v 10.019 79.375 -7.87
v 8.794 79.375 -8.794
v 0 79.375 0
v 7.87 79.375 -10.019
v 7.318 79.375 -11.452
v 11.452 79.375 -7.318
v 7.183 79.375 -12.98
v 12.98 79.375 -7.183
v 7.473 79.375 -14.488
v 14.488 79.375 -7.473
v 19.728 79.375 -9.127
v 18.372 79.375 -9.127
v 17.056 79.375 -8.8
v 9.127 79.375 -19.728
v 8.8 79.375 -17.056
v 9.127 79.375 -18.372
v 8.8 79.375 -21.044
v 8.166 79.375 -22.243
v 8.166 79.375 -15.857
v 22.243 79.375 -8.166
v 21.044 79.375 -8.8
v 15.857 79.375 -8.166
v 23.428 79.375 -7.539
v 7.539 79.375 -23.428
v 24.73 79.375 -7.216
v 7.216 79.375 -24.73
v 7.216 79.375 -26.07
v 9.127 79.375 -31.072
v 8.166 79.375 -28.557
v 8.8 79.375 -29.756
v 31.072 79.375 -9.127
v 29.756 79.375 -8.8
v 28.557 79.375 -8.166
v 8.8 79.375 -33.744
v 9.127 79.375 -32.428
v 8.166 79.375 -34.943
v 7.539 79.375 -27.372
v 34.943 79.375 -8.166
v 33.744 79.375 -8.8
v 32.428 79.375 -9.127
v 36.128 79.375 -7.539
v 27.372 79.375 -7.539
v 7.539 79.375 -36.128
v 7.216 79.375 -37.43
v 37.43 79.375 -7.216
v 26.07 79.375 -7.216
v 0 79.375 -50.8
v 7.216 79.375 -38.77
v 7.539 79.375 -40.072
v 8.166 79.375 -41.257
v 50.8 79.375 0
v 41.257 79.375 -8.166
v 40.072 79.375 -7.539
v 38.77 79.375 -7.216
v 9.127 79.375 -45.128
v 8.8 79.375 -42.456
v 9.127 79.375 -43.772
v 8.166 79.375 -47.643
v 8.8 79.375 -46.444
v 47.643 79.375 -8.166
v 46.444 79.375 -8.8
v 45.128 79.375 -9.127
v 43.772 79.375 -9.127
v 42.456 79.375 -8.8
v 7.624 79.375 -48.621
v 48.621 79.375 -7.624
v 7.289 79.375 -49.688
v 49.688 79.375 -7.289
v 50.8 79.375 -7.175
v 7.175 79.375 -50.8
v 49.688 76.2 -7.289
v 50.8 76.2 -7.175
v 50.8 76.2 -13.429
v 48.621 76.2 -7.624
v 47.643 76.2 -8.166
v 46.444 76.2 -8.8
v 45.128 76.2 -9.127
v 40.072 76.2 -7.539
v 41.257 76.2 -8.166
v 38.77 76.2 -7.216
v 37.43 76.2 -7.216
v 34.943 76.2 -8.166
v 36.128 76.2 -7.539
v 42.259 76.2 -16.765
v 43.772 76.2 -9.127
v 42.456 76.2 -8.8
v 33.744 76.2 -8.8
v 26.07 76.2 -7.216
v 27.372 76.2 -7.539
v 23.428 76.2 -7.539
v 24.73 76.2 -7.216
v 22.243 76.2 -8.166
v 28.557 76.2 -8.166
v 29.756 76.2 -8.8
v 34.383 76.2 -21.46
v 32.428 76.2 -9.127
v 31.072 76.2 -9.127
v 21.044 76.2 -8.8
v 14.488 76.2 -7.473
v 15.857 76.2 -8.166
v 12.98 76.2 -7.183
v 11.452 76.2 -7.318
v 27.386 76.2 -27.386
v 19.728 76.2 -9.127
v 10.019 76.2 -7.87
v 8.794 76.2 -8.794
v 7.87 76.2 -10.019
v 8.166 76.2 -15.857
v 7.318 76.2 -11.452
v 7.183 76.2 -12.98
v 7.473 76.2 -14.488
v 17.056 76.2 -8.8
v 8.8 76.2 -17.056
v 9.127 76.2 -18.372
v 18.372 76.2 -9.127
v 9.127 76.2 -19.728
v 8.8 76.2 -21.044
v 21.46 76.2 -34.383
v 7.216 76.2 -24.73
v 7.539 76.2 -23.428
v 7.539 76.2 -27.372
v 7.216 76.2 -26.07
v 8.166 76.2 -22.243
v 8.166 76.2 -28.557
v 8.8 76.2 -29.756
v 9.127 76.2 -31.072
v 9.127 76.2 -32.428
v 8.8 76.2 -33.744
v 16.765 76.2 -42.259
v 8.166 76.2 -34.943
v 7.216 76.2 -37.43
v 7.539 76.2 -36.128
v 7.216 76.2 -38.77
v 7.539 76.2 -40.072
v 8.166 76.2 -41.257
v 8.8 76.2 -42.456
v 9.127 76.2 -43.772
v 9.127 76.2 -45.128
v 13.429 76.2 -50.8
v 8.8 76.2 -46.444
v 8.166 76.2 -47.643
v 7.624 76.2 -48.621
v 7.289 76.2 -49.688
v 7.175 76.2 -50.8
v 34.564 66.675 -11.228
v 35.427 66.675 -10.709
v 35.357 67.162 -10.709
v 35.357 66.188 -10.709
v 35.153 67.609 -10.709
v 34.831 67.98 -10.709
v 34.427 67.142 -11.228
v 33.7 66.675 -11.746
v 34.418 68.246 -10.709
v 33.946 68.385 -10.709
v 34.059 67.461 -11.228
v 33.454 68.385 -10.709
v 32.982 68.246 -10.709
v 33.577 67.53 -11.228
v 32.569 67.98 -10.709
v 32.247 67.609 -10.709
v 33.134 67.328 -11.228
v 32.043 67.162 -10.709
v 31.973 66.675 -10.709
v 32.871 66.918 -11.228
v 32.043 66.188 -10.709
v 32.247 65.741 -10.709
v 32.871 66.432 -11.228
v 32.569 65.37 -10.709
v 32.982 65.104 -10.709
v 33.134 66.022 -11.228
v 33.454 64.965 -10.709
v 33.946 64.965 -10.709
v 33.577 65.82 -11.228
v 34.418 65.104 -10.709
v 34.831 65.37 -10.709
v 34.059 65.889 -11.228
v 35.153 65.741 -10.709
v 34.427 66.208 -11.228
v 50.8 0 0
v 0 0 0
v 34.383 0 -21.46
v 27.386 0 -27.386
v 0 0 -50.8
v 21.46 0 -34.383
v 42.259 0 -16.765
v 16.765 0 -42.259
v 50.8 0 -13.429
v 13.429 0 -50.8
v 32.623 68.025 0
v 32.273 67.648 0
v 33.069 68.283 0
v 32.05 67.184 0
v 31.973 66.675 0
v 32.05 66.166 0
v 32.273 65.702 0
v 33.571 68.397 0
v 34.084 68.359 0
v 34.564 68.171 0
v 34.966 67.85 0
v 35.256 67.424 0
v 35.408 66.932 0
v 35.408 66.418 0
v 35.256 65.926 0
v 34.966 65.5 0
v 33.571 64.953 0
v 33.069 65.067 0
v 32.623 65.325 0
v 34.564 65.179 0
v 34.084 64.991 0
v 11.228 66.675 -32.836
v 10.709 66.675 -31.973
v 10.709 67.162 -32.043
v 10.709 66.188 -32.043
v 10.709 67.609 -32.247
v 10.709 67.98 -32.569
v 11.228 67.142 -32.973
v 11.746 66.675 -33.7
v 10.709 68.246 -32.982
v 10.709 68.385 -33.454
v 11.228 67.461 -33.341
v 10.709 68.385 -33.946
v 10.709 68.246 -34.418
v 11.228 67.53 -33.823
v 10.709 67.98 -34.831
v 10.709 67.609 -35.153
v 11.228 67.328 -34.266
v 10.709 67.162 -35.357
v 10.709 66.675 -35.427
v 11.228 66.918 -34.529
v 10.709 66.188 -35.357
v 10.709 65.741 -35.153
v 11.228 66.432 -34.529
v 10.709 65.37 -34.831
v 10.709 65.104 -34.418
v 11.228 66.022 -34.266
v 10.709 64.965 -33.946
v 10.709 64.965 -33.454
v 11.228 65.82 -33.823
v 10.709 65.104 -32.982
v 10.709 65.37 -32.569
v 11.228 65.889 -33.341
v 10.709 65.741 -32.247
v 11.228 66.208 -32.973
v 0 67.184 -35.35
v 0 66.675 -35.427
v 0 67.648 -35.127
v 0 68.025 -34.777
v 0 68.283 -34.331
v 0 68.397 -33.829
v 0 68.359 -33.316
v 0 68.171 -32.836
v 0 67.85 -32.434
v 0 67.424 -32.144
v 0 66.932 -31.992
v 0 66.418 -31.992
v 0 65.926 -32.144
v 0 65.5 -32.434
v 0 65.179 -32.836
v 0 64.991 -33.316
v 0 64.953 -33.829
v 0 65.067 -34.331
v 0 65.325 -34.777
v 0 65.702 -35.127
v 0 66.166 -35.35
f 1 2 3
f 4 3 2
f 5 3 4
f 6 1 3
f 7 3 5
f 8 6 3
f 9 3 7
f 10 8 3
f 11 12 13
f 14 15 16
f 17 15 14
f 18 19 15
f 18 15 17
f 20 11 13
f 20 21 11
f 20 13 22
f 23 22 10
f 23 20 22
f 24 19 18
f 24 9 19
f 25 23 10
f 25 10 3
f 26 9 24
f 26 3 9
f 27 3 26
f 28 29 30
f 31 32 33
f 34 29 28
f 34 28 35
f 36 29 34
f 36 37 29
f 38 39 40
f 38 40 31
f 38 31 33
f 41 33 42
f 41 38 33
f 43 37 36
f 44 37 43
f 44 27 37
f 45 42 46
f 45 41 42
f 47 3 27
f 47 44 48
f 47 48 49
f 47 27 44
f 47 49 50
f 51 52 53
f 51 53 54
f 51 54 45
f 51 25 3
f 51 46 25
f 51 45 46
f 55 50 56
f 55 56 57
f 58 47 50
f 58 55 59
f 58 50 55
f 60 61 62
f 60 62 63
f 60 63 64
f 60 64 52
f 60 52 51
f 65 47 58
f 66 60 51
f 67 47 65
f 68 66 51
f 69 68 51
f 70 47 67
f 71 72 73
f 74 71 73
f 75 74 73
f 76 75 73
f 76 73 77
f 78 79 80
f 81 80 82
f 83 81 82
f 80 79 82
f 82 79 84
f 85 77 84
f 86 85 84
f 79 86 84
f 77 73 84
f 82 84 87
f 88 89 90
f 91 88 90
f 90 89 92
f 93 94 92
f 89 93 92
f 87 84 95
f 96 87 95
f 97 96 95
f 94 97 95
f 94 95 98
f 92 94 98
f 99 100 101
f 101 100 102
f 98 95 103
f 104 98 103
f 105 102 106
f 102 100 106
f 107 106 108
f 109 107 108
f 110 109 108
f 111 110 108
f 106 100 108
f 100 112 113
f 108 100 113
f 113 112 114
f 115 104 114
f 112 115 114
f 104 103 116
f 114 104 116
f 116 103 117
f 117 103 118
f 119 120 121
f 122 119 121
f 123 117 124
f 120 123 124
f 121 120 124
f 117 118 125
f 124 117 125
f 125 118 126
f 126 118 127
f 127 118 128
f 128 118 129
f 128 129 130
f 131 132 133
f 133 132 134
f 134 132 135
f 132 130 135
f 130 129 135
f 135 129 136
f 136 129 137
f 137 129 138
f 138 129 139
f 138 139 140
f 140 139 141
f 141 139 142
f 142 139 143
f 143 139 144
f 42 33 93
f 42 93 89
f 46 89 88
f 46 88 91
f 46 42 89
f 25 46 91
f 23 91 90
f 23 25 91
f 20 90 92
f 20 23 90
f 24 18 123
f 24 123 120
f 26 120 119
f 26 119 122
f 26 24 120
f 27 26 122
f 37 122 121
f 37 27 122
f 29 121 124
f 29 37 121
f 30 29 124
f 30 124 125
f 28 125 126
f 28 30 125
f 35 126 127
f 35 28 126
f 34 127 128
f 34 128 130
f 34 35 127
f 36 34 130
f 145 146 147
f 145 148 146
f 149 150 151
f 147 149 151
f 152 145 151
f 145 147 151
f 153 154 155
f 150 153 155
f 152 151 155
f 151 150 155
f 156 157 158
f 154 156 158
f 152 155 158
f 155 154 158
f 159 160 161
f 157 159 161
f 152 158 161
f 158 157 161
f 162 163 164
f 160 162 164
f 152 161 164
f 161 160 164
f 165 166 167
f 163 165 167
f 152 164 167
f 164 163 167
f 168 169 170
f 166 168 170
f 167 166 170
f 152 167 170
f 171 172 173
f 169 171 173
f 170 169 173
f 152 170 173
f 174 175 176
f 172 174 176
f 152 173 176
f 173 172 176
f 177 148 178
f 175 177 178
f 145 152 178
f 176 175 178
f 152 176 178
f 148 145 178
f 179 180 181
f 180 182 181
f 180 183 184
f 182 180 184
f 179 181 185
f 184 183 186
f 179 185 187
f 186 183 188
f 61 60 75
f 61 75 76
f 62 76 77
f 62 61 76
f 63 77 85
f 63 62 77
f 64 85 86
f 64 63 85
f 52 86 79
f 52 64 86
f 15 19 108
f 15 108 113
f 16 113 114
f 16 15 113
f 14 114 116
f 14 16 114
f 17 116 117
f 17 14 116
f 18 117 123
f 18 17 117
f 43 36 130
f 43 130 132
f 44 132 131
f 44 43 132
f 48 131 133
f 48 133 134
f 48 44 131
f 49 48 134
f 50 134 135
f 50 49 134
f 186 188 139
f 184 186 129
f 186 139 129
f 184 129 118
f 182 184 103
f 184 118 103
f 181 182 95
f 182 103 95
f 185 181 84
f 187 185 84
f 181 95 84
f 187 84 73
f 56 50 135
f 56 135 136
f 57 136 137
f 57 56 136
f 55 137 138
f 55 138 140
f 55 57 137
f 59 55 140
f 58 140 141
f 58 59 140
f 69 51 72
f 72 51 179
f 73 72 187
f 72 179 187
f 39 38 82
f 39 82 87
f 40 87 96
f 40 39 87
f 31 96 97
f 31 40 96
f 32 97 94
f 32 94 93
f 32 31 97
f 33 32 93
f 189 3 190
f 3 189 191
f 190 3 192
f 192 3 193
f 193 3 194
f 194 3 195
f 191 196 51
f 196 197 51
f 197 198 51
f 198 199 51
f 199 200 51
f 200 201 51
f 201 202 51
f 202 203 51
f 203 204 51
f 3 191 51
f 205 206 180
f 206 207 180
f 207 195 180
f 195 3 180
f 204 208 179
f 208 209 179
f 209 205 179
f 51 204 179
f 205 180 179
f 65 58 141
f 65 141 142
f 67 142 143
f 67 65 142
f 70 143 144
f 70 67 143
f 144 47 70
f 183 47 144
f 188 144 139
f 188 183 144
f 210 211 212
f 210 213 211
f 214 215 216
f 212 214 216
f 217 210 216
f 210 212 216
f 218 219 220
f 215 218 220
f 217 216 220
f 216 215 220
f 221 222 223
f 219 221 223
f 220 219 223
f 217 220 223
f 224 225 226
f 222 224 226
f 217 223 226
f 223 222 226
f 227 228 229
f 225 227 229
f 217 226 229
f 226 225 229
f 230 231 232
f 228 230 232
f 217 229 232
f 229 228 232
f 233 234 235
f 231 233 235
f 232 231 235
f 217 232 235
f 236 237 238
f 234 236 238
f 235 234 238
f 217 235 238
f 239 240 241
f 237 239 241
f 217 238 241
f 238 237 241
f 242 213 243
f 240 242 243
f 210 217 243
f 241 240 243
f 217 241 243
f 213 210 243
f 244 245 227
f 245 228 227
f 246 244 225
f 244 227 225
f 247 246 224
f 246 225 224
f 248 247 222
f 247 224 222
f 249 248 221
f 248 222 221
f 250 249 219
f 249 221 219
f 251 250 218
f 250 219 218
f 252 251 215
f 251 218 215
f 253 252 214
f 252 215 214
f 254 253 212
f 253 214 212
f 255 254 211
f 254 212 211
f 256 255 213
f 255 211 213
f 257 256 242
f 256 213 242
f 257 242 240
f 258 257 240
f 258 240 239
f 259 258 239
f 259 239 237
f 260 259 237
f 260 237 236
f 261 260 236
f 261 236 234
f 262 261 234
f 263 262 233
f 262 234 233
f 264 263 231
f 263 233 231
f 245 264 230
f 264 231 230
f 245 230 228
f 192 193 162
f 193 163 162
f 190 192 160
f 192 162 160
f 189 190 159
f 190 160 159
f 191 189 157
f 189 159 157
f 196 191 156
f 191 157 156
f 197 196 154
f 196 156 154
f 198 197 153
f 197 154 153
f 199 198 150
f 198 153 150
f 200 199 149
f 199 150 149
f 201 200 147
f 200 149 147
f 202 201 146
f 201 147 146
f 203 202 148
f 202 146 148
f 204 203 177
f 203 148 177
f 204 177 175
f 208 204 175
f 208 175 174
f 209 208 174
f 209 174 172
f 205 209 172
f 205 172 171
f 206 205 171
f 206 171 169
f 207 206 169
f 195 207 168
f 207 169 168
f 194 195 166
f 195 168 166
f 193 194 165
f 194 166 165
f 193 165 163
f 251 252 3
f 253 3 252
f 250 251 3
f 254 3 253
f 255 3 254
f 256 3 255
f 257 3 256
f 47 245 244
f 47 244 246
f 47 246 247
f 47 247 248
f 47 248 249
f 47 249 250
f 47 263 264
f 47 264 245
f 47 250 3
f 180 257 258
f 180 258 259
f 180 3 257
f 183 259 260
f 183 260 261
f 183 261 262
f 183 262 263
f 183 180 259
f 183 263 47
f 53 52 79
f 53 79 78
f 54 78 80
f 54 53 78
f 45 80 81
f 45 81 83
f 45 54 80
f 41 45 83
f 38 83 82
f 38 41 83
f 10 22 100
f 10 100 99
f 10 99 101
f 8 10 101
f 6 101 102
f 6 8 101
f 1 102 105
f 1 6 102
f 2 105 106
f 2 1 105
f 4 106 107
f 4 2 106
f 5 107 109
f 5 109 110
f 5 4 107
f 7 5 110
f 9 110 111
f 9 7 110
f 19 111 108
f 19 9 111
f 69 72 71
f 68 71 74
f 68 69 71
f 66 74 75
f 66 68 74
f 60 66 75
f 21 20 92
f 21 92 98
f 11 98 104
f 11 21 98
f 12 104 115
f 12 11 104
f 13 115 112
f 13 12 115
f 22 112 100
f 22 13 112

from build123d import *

# Parameters (mm, degrees)
SKETCH1_W                 = 50.8
SKETCH1_H                 = 50.8
BOSS_EXTRUDE1_DEPTH       = 79.375
CUT_EXTRUDE1_DEPTH        = 3.175
SKETCH3_R                 = 55.5625
CUT_EXTRUDE2_DEPTH        = 108.059192156
F_8_32_TAPPED_HOLE1_D     = 3.4544
F_8_32_TAPPED_HOLE1_DEPTH = 10.70864
F_8_32_TAPPED_HOLE1_TIP   = 1.037806461
F_8_32_TAPPED_HOLE2_D     = 3.4544
F_8_32_TAPPED_HOLE2_DEPTH = 10.70864
F_8_32_TAPPED_HOLE2_TIP   = 1.037806461


with BuildPart() as part:
    # Sketch1 → Boss-Extrude1 (new body)
    with BuildSketch(Plane(origin=(0, 0, 0), x_dir=(1, 0, 0), z_dir=(0, 1, 0))):
        with Locations((25.4, 25.4)):
            Rectangle(SKETCH1_W, SKETCH1_H)
    extrude(amount=BOSS_EXTRUDE1_DEPTH)

    # Sketch2 → Cut-Extrude1 (cut)
    with BuildSketch(Plane(origin=(0, 79.375, 0), x_dir=(1, 0, 0), z_dir=(0, 1, 0))):
        with BuildLine():
            Line((130.016993909, 125.017737196), (134.25782275, 78.573759143))
            ThreePointArc((134.25782275, 78.573759143), (134.034685181, 75.298190088), (132.798116214, 72.256802214))
            ThreePointArc((132.798116214, 72.256802214), (130.01096738, 66.280890285), (128.580118229, 59.844090402))
            ThreePointArc((128.580118229, 59.844090402), (125.846501332, 47.24207899), (120.576283082, 35.473130329))
            ThreePointArc((120.576283082, 35.473130329), (120.013426501, 34.114565768), (119.824473194, 32.656209898))
            ThreePointArc((119.824473194, 32.656209898), (117.90735564, 28.45485307), (113.469501546, 27.177281171))
            ThreePointArc((113.469501546, 27.177281171), (106.116591491, 23.83727612), (106.198458812, 15.761744078))
            ThreePointArc((106.198458812, 15.761744078), (105.465515747, 8.75311664), (98.443142857, 8.166309094))
            ThreePointArc((98.443142857, 8.166309094), (95.25, 9.168506799), (92.056857143, 8.166309094))
            ThreePointArc((92.056857143, 8.166309094), (88.9, 7.1755), (85.743142857, 8.166309094))
            ThreePointArc((85.743142857, 8.166309094), (82.55, 9.168506799), (79.356857143, 8.166309094))
            ThreePointArc((79.356857143, 8.166309094), (76.212257074, 7.175513597), (73.063291467, 8.152345678))
            ThreePointArc((73.063291467, 8.152345678), (69.907489389, 9.140393728), (66.74574768, 8.171520637))
            ThreePointArc((66.74574768, 8.171520637), (63.508942298, 7.175501389), (60.273525168, 8.176020964))
            ThreePointArc((60.273525168, 8.176020964), (57.10532095, 9.149271709), (53.943097961, 8.156759366))
            ThreePointArc((53.943097961, 8.156759366), (50.791625748, 7.175506347), (47.643142857, 8.166309094))
            ThreePointArc((47.643142857, 8.166309094), (44.45, 9.168506799), (41.256857143, 8.166309094))
            ThreePointArc((41.256857143, 8.166309094), (38.1, 7.1755), (34.943142857, 8.166309094))
            ThreePointArc((34.943142857, 8.166309094), (31.75, 9.168506799), (28.556857143, 8.166309094))
            ThreePointArc((28.556857143, 8.166309094), (25.4, 7.1755), (22.243142857, 8.166309094))
            ThreePointArc((22.243142857, 8.166309094), (19.05, 9.168506799), (15.856857143, 8.166309094))
            ThreePointArc((15.856857143, 8.166309094), (8.793588587, 8.793588587), (8.166309094, 15.856857143))
            ThreePointArc((8.166309094, 15.856857143), (9.168506799, 19.05), (8.166309094, 22.243142857))
            ThreePointArc((8.166309094, 22.243142857), (7.1755, 25.4), (8.166309094, 28.556857143))
            ThreePointArc((8.166309094, 28.556857143), (9.168506799, 31.75), (8.166309094, 34.943142857))
            ThreePointArc((8.166309094, 34.943142857), (7.1755, 38.1), (8.166309094, 41.256857143))
            ThreePointArc((8.166309094, 41.256857143), (9.168506799, 44.45), (8.166309094, 47.643142857))
            ThreePointArc((8.166309094, 47.643142857), (7.175506347, 50.791625748), (8.156759366, 53.943097961))
            ThreePointArc((8.156759366, 53.943097961), (9.149271709, 57.10532095), (8.176020964, 60.273525168))
            ThreePointArc((8.176020964, 60.273525168), (7.175501389, 63.508942298), (8.171520637, 66.74574768))
            ThreePointArc((8.171520637, 66.74574768), (9.140393728, 69.907489389), (8.152345678, 73.063291467))
            ThreePointArc((8.152345678, 73.063291467), (7.175513597, 76.212257074), (8.166309094, 79.356857143))
            ThreePointArc((8.166309094, 79.356857143), (9.168506799, 82.55), (8.166309094, 85.743142857))
            ThreePointArc((8.166309094, 85.743142857), (7.1755, 88.9), (8.166309094, 92.056857143))
            ThreePointArc((8.166309094, 92.056857143), (9.168506799, 95.25), (8.166309094, 98.443142857))
            ThreePointArc((8.166309094, 98.443142857), (8.75311664, 105.465515747), (15.761744078, 106.198458812))
            ThreePointArc((15.761744078, 106.198458812), (23.83727612, 106.116591491), (27.177281171, 113.469501546))
            ThreePointArc((27.177281171, 113.469501546), (28.45485307, 117.90735564), (32.656209898, 119.824473194))
            ThreePointArc((32.656209898, 119.824473194), (34.114565768, 120.013426501), (35.473130329, 120.576283082))
            ThreePointArc((35.473130329, 120.576283082), (47.24207899, 125.846501332), (59.844090402, 128.580118229))
            ThreePointArc((59.844090402, 128.580118229), (68.705211612, 130.952457845), (76.452938417, 135.863689229))
            ThreePointArc((76.452938417, 135.863689229), (80.625736152, 138.0725352), (85.345346996, 138.201045691))
            Line((85.345346996, 138.201045691), (125.626948268, 129.926898817))
            ThreePointArc((125.626948268, 129.926898817), (128.63345164, 128.197989094), (130.016993909, 125.017737196))
        make_face()
    extrude(amount=-CUT_EXTRUDE1_DEPTH, mode=Mode.SUBTRACT)

    # Sketch3 → Cut-Extrude2 (cut, through all)
    with BuildSketch(Plane(origin=(0, 79.375, 0), x_dir=(1, 0, 0), z_dir=(0, 1, 0))):
        with Locations((66.675, 66.675)):
            Circle(SKETCH3_R)
    extrude(amount=-CUT_EXTRUDE2_DEPTH, mode=Mode.SUBTRACT)

    # #8-32 Tapped Hole1
    with Locations(Plane(origin=(393.7, -15.875, 0), x_dir=(1, 0, 0), z_dir=(0, 0, 1))):
        with Locations((-300, 82.55), (-240, 82.55), (-180, 82.55), (-60, 82.55), (0, 82.55), (60, 82.55), (120, 82.55), (180, 82.55), (240, 82.55), (-120, 82.55), (-360, 82.55), (300, 82.55), (360, 82.55)):
            Hole(F_8_32_TAPPED_HOLE1_D / 2, depth=F_8_32_TAPPED_HOLE1_DEPTH)
            with Locations((0, 0, -(F_8_32_TAPPED_HOLE1_DEPTH + F_8_32_TAPPED_HOLE1_TIP / 2))):  # 118° drill point
                Cone(0, F_8_32_TAPPED_HOLE1_D / 2, F_8_32_TAPPED_HOLE1_TIP, mode=Mode.SUBTRACT)

    # #8-32 Tapped Hole2
    with Locations(Plane(origin=(0, -15.875, -393.7), x_dir=(0, 0, 1), z_dir=(-1, 0, 0))):
        with Locations((-300, 82.55), (-240, 82.55), (-180, 82.55), (-60, 82.55), (0, 82.55), (60, 82.55), (120, 82.55), (180, 82.55), (240, 82.55), (-120, 82.55), (-360, 82.55), (300, 82.55), (360, 82.55)):
            Hole(F_8_32_TAPPED_HOLE2_D / 2, depth=F_8_32_TAPPED_HOLE2_DEPTH)
            with Locations((0, 0, -(F_8_32_TAPPED_HOLE2_DEPTH + F_8_32_TAPPED_HOLE2_TIP / 2))):  # 118° drill point
                Cone(0, F_8_32_TAPPED_HOLE2_D / 2, F_8_32_TAPPED_HOLE2_TIP, mode=Mode.SUBTRACT)


solid = part.part
